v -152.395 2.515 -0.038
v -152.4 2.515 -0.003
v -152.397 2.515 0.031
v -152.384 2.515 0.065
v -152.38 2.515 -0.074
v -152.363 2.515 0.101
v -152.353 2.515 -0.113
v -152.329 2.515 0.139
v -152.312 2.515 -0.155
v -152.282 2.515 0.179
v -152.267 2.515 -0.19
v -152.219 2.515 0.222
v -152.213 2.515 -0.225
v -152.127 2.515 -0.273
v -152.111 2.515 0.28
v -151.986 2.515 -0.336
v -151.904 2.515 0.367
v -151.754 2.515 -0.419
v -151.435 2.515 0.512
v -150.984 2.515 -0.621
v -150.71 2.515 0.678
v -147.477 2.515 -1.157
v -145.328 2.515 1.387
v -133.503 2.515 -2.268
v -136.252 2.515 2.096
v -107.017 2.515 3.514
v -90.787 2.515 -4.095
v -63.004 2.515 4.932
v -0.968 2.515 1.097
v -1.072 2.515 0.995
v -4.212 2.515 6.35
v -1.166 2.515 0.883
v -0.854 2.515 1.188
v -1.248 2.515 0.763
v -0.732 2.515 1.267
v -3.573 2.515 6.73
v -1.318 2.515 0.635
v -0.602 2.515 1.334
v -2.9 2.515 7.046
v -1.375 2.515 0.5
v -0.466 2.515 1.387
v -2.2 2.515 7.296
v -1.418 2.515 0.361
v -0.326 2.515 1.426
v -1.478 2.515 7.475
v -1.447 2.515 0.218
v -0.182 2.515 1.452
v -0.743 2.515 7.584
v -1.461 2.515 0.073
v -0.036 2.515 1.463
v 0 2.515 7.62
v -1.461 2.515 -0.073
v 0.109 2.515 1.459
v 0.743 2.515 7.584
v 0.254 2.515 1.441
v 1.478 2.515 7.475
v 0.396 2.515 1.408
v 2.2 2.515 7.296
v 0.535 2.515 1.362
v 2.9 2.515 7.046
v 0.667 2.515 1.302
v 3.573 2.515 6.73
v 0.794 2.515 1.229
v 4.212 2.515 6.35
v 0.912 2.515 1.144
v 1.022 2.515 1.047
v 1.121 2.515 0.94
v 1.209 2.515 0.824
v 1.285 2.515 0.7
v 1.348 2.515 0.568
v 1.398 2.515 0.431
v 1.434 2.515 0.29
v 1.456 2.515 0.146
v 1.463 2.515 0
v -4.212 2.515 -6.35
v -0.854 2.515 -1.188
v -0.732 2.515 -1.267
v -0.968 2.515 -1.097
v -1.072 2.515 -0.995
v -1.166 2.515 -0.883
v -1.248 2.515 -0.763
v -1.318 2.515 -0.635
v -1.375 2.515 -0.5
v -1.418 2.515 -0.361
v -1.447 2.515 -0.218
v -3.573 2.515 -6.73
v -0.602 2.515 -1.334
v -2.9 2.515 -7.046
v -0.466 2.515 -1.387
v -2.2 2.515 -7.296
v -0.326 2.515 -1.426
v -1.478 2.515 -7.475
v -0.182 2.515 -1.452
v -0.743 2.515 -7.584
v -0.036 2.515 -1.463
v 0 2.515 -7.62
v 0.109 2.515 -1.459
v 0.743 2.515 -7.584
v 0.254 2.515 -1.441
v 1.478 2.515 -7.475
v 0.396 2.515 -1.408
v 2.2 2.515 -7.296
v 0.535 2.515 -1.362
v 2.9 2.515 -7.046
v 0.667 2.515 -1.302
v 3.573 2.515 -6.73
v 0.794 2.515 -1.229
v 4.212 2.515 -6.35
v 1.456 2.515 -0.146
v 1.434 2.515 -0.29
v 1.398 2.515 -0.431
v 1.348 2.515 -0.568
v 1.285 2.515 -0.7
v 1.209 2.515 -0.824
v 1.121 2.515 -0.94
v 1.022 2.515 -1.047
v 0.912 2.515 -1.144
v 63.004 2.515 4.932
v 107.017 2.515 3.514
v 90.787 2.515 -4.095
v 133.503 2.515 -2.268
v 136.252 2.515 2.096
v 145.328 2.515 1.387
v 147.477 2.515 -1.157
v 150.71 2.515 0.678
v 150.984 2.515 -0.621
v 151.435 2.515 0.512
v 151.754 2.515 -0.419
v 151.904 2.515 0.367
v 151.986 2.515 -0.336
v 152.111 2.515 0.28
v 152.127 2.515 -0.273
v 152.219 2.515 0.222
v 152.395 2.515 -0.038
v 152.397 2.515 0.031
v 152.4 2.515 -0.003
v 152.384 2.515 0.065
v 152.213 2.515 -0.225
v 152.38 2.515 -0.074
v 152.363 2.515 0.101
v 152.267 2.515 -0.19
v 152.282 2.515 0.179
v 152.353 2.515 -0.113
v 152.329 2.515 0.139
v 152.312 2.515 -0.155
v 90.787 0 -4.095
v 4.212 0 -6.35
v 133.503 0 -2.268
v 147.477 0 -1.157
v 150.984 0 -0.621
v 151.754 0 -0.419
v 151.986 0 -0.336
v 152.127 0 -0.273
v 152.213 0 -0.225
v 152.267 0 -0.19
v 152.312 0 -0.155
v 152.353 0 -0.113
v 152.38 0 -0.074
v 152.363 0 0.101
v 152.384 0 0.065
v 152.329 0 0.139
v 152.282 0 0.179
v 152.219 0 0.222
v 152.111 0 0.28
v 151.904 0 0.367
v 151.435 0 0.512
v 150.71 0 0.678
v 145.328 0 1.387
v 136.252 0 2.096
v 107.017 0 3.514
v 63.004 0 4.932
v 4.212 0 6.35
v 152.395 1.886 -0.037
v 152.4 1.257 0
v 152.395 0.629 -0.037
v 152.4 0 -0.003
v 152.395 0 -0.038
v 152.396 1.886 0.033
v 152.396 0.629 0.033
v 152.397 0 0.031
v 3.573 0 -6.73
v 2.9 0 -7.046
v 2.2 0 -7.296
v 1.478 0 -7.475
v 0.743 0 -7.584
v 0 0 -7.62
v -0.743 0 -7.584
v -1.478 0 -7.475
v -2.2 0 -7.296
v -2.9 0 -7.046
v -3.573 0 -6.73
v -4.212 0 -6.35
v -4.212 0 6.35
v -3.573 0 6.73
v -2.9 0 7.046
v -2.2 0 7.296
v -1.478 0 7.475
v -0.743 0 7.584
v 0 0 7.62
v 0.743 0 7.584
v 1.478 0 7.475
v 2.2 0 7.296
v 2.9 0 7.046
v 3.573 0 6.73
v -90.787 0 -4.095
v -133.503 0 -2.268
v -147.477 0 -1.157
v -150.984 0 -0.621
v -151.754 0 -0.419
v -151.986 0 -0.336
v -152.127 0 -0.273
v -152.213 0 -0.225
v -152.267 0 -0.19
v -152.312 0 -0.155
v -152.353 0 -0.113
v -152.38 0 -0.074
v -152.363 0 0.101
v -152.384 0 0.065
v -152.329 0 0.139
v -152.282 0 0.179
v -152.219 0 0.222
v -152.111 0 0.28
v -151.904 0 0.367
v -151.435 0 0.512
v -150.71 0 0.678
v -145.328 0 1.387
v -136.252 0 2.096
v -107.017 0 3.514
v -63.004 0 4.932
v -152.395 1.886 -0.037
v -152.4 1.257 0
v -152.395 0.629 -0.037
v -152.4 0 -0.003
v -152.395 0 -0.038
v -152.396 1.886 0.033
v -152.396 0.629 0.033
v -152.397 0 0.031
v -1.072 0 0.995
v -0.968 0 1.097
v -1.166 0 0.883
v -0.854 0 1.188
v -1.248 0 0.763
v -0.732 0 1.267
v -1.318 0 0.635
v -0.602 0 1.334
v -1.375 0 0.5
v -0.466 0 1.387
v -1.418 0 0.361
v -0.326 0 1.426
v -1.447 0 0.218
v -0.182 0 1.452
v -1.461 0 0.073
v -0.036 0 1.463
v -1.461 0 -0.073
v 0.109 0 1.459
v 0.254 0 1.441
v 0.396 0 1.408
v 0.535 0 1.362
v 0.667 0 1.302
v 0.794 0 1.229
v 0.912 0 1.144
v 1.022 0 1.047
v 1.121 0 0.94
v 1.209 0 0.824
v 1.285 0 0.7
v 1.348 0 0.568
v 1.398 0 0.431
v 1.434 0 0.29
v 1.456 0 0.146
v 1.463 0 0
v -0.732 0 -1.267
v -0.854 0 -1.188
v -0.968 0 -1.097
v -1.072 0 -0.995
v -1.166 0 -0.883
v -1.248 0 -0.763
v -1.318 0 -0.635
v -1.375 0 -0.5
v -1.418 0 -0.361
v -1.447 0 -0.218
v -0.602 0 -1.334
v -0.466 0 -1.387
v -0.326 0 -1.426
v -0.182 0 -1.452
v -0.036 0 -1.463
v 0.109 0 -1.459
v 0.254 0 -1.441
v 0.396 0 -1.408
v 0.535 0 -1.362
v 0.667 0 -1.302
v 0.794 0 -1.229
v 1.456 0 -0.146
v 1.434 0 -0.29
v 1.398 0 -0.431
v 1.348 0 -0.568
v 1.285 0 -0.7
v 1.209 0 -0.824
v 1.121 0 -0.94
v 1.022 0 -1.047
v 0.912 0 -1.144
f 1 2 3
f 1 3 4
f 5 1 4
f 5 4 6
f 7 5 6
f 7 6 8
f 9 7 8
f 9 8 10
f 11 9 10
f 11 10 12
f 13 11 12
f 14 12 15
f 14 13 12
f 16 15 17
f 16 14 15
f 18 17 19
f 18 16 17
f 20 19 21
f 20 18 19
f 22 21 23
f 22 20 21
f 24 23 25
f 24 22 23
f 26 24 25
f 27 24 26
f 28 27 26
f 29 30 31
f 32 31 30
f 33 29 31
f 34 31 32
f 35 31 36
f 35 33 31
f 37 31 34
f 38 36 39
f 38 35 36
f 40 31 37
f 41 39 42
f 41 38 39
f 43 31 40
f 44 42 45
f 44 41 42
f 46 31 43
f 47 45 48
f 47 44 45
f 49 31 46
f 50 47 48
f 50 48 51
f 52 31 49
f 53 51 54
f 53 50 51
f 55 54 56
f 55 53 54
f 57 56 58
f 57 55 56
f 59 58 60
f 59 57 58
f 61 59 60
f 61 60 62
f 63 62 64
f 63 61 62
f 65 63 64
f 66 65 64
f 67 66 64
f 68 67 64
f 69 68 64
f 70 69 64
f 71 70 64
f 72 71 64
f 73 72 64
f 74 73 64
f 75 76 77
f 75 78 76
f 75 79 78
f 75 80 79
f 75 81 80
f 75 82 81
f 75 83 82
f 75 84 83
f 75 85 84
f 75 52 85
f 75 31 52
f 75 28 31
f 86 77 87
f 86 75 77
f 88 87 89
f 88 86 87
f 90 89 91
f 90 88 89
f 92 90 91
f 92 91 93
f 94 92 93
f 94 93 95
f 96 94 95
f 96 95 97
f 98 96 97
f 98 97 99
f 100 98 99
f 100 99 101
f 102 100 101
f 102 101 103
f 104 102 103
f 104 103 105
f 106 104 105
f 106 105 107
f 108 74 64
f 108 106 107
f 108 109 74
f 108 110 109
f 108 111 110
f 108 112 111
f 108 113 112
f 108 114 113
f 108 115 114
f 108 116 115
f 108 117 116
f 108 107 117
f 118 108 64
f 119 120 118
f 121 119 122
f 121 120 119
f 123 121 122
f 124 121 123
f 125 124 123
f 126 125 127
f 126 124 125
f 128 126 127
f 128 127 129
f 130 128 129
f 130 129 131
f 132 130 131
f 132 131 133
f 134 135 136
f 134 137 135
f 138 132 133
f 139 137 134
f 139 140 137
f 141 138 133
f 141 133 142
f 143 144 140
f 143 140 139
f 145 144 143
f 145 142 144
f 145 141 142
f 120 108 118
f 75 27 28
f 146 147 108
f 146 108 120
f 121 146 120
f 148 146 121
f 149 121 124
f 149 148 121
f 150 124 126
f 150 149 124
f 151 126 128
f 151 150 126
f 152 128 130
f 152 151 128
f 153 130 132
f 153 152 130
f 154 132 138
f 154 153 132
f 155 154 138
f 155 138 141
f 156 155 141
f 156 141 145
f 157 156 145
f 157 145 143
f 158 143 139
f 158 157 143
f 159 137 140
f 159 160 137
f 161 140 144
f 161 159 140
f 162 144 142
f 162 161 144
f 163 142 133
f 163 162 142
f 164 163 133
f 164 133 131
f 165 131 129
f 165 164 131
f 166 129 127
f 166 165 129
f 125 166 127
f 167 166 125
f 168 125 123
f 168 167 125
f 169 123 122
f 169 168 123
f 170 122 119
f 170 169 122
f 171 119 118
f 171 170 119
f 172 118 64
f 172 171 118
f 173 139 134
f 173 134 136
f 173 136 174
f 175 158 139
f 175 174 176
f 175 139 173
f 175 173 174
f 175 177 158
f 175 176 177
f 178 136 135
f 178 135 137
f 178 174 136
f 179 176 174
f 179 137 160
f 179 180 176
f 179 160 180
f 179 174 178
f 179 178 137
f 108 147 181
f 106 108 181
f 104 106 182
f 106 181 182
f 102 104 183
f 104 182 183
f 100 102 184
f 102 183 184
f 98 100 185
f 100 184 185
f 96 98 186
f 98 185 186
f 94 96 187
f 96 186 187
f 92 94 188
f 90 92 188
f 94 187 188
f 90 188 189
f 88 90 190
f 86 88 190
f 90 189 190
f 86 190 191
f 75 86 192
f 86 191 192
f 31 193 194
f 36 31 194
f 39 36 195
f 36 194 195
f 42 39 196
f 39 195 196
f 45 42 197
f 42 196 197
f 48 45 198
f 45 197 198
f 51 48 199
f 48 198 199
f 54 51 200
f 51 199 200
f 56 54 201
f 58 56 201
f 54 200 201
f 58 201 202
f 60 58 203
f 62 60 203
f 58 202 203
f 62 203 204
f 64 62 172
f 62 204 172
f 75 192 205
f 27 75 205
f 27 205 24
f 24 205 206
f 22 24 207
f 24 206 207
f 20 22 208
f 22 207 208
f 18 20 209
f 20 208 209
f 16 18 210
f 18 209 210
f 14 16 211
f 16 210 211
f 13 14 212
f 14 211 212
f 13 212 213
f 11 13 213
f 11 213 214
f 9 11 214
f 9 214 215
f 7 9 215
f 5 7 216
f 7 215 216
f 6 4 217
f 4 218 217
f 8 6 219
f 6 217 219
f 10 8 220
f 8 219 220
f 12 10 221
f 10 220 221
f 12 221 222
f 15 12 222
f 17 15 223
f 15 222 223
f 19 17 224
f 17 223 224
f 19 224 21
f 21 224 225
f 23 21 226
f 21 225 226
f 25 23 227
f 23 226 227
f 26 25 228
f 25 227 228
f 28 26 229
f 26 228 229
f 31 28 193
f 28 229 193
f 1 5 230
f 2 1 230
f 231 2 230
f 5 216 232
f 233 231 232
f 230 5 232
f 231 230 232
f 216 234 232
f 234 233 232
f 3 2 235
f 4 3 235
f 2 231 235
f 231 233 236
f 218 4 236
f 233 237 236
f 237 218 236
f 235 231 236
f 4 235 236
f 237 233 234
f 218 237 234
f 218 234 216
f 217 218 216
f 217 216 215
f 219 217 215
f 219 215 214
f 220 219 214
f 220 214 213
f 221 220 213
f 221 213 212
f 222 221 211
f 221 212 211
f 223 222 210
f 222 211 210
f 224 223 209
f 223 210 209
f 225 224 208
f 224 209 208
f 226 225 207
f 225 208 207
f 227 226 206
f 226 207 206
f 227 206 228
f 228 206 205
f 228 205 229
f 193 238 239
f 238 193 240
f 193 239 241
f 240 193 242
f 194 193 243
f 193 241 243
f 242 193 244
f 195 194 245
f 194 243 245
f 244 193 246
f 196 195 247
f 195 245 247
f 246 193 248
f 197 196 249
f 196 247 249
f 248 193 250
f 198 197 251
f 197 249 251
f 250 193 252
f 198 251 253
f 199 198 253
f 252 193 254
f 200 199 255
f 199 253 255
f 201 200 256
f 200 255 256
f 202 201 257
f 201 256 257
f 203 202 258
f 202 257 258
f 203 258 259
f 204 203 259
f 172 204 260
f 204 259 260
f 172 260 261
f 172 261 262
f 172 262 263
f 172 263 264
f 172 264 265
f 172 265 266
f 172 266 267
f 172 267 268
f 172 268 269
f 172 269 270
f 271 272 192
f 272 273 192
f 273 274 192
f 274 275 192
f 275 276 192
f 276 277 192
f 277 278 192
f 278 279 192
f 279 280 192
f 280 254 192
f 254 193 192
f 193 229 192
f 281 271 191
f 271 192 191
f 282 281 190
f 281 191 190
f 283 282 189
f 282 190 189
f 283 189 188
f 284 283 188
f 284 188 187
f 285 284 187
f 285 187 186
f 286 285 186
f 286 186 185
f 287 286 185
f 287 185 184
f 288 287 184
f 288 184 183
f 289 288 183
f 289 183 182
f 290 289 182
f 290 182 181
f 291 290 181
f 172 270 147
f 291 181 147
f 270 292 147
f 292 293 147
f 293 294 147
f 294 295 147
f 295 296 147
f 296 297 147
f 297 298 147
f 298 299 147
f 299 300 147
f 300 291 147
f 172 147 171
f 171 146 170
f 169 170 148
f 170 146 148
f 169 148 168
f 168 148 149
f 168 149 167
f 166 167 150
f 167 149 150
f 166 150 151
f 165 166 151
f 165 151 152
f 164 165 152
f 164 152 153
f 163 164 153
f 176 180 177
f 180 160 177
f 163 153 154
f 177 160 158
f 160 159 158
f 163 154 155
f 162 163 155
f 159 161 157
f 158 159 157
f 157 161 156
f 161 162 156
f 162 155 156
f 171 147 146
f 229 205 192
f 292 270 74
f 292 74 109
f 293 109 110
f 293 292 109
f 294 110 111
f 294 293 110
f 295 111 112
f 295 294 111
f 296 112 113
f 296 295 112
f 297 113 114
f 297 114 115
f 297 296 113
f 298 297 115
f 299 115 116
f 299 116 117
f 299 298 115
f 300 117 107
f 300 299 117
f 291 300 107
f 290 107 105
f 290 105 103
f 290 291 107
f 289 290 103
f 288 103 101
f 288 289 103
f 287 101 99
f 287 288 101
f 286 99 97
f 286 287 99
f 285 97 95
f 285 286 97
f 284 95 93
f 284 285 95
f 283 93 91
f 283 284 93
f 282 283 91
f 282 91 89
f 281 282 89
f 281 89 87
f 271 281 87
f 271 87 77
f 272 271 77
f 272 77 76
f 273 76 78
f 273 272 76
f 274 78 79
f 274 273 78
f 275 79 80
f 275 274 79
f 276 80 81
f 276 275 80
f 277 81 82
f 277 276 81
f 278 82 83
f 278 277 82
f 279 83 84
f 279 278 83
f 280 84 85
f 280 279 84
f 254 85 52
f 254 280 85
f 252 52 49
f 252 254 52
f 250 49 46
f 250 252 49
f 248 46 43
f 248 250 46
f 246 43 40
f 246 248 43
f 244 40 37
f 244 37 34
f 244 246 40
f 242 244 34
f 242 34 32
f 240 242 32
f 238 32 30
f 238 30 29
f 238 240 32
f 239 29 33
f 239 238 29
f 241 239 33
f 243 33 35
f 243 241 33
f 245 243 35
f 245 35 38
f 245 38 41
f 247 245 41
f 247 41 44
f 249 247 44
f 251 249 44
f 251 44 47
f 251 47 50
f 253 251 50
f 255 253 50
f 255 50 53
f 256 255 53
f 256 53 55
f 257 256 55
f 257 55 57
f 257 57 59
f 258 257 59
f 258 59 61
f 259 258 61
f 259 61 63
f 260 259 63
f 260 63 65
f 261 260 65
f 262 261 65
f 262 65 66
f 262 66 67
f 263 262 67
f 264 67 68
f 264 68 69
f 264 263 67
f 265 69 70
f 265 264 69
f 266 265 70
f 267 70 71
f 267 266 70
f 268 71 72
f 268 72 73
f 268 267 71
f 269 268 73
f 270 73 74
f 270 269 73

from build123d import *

# Parameters (mm, degrees)
SKETCH2_R           = 1.46304
BOSS_EXTRUDE1_DEPTH = 2.5146


with BuildPart() as part:
    # Sketch2 → Boss-Extrude1 (new body)
    with BuildSketch(Plane(origin=(0, 0, 0), x_dir=(1, 0, 0), z_dir=(0, 1, 0))):
        with BuildLine():
            ThreePointArc((-4.212113484, -6.35), (0, -7.62), (4.212113484, -6.35))
            add(Edge.make_bspline(
                [(4.212113484, 6.35), (300.587886516, 0), (4.212113484, -6.35)],
                knots=[0, 0, 0, 1, 1, 1], degree=2))
            ThreePointArc((4.212113484, 6.35), (0, 7.62), (-4.212113484, 6.35))
            add(Edge.make_bspline(
                [(-4.212113484, 6.35), (-300.587886516, 0), (-4.212113484, -6.35)],
                knots=[0, 0, 0, 1, 1, 1], degree=2))
        make_face()
        Circle(SKETCH2_R, mode=Mode.SUBTRACT)
    extrude(amount=BOSS_EXTRUDE1_DEPTH)


solid = part.part
